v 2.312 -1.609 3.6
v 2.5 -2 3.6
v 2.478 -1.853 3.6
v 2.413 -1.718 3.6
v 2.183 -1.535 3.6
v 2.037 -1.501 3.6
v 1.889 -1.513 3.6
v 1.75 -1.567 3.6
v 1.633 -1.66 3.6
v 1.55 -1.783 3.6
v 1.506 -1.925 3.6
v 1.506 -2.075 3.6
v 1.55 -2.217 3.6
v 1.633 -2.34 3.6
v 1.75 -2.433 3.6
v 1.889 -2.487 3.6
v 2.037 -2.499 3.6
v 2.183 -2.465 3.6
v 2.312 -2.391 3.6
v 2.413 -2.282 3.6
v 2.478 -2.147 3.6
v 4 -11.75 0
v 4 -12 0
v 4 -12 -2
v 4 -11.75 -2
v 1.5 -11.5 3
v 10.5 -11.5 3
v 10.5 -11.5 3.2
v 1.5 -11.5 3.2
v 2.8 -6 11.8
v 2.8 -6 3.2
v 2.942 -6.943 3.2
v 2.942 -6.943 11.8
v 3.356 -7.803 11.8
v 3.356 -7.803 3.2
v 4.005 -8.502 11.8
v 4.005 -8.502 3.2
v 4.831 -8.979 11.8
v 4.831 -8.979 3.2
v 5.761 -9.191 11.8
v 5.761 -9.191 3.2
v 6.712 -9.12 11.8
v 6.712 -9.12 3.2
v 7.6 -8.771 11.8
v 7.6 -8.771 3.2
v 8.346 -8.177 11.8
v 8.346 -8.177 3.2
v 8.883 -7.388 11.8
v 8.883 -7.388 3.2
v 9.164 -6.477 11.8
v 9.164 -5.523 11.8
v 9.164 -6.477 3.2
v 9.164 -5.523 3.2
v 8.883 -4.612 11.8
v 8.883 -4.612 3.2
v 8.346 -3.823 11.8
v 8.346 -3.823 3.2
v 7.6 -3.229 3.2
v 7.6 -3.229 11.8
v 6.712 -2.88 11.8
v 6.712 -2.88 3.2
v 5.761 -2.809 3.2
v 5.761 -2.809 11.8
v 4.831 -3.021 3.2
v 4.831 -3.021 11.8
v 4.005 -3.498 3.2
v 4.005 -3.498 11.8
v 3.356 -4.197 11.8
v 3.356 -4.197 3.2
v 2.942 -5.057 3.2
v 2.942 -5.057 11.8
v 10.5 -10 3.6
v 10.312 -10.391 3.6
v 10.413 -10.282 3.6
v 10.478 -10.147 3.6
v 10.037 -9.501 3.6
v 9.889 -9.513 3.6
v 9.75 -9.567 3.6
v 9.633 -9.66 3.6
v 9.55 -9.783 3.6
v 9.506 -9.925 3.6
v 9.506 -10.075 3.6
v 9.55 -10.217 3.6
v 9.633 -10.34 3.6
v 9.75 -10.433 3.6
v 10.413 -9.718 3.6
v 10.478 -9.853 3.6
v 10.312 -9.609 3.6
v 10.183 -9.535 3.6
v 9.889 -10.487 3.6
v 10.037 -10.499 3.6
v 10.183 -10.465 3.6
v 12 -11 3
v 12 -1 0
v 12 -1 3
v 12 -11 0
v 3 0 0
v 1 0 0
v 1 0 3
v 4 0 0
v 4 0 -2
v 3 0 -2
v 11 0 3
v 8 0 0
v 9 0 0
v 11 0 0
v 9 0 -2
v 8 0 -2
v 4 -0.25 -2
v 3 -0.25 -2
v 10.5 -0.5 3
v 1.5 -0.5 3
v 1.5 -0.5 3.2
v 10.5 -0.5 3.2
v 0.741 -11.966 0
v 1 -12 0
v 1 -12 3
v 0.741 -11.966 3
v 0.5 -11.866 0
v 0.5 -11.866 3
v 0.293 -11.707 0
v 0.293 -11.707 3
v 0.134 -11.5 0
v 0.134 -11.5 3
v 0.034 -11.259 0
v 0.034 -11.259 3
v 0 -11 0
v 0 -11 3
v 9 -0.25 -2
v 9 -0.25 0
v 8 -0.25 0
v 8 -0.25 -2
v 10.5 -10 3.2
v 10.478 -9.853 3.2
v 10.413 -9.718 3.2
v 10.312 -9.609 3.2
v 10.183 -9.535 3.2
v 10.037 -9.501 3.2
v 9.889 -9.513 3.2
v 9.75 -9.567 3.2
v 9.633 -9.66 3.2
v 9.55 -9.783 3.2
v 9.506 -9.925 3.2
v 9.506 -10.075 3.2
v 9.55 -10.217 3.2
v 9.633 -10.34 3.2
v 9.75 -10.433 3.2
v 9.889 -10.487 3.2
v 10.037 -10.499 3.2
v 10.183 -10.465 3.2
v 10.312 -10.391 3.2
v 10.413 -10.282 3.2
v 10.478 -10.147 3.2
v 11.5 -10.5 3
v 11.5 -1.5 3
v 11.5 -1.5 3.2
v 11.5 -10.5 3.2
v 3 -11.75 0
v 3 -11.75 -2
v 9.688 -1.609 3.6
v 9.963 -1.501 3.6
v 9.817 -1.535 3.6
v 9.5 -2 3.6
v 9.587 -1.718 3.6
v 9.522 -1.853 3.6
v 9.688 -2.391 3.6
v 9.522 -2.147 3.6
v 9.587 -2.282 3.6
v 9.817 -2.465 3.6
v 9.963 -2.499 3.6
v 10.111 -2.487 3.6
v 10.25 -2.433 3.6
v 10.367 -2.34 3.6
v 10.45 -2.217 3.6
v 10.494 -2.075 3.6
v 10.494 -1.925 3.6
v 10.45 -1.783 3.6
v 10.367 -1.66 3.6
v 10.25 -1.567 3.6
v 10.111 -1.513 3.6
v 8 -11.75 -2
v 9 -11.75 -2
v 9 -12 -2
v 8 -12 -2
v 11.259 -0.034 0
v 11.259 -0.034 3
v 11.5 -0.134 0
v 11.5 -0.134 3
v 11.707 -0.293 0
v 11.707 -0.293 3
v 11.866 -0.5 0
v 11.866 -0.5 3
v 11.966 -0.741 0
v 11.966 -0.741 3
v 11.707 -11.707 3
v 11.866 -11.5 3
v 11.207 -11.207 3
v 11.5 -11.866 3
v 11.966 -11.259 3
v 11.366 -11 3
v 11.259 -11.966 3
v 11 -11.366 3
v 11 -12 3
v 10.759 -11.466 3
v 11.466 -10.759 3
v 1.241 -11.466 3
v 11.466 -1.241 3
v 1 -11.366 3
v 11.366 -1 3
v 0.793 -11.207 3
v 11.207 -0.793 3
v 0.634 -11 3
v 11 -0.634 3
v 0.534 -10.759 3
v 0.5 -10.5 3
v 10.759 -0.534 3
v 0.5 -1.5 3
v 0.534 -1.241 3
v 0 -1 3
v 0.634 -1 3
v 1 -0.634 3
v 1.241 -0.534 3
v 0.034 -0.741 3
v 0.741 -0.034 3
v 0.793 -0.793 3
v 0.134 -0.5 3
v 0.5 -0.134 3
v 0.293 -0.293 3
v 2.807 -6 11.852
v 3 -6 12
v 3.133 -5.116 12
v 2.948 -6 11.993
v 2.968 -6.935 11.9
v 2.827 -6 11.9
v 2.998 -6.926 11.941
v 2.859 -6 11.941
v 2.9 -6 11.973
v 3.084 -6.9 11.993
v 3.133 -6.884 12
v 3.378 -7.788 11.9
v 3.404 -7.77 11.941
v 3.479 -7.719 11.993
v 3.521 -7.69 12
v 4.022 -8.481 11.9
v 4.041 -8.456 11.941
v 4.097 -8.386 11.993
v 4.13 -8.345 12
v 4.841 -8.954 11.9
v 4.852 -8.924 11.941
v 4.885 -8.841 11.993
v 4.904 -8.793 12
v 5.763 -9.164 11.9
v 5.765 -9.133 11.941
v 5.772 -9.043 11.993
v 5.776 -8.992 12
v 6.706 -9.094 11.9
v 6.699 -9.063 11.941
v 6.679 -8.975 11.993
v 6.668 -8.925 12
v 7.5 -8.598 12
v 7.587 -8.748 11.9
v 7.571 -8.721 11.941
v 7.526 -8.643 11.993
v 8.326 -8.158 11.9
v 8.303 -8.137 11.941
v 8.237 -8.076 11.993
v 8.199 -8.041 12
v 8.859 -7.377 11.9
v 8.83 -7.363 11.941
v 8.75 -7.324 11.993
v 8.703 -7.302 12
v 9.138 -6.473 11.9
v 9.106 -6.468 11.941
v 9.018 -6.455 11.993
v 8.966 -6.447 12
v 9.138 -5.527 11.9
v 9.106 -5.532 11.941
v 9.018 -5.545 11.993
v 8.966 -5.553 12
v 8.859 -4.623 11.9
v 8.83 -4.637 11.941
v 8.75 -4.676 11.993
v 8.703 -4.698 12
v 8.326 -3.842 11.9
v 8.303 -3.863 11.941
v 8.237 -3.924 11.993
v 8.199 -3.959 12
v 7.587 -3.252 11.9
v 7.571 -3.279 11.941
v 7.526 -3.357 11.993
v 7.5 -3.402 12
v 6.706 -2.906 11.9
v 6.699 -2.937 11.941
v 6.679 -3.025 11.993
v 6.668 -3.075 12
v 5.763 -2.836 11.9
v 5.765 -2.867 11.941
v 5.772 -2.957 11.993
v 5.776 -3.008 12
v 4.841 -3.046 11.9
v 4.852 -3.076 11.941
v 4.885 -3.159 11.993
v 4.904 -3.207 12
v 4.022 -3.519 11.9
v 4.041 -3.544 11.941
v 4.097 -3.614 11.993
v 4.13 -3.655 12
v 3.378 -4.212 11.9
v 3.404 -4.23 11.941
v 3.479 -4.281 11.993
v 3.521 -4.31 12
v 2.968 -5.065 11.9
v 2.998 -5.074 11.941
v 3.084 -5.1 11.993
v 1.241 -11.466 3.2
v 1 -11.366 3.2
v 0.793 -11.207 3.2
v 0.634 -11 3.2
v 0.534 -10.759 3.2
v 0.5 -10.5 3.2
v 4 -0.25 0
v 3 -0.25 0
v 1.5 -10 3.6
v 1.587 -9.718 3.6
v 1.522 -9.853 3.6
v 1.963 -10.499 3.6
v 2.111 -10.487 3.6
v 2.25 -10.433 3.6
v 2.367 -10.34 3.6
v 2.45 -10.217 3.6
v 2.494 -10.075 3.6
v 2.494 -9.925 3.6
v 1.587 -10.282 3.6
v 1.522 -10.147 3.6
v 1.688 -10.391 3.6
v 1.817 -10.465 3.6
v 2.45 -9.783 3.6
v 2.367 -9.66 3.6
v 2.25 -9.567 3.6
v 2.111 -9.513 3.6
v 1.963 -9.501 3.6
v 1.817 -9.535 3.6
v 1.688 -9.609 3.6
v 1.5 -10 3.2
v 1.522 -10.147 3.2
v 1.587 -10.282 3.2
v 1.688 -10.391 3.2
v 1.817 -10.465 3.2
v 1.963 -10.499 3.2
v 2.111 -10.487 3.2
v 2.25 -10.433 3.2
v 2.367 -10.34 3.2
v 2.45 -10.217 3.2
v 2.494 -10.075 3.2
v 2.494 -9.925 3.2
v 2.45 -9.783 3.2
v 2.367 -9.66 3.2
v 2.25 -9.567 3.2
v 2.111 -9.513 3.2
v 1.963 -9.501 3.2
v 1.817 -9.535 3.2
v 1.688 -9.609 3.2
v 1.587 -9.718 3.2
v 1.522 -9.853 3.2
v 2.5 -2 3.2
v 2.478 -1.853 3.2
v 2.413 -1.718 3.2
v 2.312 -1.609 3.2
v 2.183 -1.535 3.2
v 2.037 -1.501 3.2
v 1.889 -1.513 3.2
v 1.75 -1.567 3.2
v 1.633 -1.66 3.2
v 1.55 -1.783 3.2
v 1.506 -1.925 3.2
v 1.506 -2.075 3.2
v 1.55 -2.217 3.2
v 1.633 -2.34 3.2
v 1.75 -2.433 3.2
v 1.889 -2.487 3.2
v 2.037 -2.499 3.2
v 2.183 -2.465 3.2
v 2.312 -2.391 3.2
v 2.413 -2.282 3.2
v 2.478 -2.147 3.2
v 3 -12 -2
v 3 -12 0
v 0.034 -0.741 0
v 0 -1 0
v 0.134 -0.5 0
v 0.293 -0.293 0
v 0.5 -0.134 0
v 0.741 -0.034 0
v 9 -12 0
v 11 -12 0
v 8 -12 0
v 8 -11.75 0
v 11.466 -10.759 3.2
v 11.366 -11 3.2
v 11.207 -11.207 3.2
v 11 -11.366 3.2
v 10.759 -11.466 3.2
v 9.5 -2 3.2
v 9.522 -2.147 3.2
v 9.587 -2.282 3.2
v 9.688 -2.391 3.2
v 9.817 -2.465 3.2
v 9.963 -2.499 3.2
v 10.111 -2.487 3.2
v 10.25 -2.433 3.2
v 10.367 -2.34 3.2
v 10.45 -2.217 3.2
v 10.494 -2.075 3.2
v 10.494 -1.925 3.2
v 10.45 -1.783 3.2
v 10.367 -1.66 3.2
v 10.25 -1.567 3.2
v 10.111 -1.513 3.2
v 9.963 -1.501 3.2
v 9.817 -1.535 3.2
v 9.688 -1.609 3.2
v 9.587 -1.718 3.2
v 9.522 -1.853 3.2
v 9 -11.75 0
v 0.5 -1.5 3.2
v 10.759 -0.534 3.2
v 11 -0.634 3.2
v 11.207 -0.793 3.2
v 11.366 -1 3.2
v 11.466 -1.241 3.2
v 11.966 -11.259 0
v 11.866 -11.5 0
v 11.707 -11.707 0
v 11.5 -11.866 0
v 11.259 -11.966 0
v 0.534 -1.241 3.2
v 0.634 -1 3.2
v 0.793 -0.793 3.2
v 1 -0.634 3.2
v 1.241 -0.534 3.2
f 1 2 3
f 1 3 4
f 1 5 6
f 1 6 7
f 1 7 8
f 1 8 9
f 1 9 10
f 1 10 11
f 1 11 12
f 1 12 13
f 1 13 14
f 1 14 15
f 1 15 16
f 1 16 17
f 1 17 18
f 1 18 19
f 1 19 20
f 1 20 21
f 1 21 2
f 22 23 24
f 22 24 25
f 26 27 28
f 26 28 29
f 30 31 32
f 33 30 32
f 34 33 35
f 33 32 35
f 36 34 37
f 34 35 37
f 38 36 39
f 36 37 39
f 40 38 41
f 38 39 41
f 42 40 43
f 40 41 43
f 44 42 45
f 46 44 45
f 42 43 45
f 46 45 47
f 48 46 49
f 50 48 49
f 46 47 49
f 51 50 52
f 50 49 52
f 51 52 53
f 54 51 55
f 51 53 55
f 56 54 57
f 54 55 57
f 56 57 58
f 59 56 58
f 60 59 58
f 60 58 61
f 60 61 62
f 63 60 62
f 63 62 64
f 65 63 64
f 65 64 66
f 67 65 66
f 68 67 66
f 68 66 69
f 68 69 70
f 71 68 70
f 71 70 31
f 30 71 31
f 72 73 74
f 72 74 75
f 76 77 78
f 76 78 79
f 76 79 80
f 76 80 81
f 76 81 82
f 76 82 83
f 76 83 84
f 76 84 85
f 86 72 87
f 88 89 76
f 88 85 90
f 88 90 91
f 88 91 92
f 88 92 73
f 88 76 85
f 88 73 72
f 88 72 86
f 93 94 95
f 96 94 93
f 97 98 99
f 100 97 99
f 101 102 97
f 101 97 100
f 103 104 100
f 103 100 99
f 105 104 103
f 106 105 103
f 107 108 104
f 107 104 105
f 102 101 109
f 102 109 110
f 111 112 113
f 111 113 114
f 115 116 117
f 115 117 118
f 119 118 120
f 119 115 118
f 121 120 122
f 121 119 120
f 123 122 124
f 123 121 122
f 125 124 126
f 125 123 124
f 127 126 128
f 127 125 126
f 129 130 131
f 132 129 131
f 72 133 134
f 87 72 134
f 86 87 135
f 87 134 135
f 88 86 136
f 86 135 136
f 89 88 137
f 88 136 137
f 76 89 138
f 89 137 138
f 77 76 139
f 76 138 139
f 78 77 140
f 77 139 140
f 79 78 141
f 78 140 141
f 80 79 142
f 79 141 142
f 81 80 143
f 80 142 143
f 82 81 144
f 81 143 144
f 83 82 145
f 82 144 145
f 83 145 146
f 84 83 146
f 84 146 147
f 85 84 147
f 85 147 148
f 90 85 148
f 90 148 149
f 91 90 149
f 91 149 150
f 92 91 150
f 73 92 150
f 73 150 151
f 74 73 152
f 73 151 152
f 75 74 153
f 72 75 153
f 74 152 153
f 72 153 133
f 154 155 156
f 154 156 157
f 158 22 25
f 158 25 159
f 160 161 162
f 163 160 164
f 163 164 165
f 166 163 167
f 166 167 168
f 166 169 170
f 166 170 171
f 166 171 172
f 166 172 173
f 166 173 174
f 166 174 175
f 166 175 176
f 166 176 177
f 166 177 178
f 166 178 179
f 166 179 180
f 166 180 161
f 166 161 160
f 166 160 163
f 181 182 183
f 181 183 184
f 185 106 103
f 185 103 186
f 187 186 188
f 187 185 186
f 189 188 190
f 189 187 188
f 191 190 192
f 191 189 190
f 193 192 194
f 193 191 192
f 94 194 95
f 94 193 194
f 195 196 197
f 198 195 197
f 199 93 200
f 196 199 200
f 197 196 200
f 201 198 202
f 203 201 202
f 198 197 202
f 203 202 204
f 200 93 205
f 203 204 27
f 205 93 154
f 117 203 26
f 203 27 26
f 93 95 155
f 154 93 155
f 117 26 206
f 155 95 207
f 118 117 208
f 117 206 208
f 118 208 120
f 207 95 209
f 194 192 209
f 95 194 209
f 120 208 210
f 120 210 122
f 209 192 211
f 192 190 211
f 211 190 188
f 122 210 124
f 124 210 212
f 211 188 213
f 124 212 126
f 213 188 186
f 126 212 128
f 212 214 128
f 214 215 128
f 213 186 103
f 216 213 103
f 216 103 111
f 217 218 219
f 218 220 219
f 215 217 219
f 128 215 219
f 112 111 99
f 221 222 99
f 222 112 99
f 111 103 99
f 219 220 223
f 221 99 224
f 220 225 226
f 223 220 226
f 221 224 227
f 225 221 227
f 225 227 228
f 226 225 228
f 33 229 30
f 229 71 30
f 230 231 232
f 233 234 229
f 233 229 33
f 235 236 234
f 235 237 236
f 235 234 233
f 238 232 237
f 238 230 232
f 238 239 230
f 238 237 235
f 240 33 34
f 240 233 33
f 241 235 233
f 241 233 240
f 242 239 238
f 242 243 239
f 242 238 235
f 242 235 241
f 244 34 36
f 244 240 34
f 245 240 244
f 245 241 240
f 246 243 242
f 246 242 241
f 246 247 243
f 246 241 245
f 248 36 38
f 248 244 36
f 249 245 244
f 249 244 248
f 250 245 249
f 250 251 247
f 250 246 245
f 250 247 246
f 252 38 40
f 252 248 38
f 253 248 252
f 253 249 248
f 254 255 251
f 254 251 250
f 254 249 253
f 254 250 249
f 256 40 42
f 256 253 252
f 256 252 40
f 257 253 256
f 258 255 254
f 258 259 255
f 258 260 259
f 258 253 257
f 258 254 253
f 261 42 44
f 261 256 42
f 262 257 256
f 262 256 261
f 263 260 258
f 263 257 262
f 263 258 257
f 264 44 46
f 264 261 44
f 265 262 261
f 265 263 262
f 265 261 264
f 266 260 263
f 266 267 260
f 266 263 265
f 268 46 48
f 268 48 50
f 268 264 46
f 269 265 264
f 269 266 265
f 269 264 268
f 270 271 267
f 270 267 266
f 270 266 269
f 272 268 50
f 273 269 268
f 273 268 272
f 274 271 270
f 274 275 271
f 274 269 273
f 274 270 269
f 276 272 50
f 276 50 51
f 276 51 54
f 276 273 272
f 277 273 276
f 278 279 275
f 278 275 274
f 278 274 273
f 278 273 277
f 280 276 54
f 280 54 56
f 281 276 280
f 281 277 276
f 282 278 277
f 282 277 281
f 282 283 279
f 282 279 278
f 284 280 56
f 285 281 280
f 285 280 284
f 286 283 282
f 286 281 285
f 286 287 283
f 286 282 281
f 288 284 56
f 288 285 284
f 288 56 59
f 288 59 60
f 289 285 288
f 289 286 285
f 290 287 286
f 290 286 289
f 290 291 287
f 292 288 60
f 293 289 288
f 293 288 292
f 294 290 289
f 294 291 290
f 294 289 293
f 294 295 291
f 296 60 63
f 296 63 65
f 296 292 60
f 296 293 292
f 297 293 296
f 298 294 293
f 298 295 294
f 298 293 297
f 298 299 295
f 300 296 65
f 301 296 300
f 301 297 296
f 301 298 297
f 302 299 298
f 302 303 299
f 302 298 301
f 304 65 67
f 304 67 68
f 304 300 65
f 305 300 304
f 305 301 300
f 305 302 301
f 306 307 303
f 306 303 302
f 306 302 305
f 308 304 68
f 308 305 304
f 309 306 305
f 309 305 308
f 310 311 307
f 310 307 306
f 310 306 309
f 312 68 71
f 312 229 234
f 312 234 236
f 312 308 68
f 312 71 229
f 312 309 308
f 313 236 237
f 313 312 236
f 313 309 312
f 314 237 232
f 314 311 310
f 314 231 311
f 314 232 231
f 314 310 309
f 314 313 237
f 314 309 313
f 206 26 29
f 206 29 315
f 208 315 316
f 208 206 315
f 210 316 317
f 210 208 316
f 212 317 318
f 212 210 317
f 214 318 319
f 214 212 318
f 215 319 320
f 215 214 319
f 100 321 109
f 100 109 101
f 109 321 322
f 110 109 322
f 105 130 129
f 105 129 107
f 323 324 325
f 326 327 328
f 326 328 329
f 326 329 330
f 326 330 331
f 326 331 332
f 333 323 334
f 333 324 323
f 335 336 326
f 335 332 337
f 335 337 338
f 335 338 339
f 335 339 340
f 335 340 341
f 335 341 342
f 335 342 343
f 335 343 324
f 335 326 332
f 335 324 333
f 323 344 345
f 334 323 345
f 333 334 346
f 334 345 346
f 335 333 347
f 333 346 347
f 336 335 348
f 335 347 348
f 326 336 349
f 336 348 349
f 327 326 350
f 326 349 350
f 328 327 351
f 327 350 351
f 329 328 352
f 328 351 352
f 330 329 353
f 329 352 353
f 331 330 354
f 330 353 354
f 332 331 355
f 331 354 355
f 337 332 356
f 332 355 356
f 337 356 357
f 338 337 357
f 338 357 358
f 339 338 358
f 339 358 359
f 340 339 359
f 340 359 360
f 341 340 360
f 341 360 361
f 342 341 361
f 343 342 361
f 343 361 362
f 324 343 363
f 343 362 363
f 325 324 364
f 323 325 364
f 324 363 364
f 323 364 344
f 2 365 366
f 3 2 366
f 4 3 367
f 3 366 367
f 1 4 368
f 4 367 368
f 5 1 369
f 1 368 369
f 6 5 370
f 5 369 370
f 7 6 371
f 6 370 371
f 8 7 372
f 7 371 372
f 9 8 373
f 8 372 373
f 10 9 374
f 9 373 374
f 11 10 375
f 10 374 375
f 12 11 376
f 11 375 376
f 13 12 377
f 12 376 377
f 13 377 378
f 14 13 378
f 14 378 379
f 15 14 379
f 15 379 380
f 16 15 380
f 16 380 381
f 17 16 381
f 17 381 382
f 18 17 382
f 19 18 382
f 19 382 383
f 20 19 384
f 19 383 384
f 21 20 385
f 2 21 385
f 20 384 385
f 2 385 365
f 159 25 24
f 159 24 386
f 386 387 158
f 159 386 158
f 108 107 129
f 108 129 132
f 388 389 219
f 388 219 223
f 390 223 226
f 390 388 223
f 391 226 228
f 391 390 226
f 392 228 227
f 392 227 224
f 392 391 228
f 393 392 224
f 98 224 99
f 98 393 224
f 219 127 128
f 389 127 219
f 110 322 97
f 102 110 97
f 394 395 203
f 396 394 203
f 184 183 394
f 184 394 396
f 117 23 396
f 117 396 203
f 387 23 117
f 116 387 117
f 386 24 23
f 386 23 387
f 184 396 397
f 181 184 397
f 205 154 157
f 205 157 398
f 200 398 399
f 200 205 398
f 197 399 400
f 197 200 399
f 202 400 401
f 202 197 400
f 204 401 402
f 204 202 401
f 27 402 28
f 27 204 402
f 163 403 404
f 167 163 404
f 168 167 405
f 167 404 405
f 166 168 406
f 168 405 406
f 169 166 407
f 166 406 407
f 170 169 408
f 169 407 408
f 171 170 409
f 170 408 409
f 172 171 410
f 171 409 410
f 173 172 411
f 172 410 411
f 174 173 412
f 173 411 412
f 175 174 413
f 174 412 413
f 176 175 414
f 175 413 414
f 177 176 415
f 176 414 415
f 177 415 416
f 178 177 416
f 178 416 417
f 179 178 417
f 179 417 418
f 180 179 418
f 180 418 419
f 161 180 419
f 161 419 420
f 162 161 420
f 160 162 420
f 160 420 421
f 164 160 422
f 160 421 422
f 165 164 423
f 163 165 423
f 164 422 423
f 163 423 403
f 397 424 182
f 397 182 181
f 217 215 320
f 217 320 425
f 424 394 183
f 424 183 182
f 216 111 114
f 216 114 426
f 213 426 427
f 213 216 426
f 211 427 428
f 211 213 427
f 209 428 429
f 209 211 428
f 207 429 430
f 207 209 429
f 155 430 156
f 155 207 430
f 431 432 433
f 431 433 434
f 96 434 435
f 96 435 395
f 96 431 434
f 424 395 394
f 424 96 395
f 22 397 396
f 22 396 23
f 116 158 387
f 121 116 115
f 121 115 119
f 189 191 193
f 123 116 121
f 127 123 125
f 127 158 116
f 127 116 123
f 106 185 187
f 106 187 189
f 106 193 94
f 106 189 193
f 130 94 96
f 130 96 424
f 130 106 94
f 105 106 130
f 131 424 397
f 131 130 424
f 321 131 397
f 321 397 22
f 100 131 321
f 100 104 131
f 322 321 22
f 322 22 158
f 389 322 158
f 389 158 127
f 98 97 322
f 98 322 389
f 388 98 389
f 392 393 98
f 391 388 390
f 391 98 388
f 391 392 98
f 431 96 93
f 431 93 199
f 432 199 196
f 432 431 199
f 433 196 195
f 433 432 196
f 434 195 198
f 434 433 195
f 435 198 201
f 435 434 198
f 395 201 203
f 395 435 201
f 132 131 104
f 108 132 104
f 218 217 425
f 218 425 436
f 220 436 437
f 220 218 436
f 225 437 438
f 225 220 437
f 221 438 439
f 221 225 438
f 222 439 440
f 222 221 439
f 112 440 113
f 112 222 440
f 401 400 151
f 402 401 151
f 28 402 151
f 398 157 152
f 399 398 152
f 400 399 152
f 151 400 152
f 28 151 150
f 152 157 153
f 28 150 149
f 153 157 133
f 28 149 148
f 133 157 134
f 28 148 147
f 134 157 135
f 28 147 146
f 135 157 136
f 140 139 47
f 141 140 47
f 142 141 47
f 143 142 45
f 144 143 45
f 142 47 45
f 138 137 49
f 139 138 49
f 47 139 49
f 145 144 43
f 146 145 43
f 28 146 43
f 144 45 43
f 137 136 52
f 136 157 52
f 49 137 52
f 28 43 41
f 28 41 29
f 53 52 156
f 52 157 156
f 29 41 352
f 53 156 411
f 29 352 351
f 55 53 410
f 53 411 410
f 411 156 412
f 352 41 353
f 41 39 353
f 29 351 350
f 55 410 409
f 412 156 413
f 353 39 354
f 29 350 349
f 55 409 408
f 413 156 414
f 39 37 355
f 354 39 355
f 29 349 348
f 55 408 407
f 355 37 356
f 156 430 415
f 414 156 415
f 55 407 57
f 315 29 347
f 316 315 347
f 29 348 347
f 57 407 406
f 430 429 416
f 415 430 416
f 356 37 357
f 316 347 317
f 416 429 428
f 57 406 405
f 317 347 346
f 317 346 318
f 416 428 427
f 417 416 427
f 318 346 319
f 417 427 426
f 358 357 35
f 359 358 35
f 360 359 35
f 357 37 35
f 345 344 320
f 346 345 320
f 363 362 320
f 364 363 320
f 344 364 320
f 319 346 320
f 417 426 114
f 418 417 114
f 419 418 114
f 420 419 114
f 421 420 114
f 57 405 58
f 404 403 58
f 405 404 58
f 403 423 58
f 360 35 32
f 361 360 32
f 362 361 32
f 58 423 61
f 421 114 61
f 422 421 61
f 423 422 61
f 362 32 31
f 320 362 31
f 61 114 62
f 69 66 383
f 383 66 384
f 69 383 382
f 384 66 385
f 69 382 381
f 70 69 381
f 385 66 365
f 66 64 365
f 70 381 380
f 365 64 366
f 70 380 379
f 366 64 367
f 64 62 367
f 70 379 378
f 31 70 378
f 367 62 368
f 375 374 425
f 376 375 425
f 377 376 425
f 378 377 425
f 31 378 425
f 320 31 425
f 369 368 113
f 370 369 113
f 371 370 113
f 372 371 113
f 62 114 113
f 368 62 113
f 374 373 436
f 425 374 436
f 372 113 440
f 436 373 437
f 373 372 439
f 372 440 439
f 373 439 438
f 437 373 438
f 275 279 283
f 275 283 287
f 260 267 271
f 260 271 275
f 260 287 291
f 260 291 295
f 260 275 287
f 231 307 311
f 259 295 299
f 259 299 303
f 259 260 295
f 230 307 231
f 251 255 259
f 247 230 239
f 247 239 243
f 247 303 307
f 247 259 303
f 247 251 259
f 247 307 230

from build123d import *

# Parameters (mm, degrees)
EXTRUDE_1_DEPTH = 3
SKETCH_2_R      = 3.2
EXTRUDE_2_DEPTH = 9
FILLET_1_R      = 0.2
EXTRUDE_3_DEPTH = 0.2
SKETCH_4_R      = 0.5
EXTRUDE_4_DEPTH = 0.4
SKETCH_5_W      = 1
SKETCH_5_H      = 0.25
EXTRUDE_5_DEPTH = 2


with BuildPart() as part:
    # 草图1 → 凸台-拉伸1 (new body)
    with BuildSketch(Plane.XY):
        with BuildLine():
            Line((1, 0), (11, 0))
            ThreePointArc((11, 0), (11.707106781, -0.292893219), (12, -1))
            Line((12, -1), (12, -11))
            ThreePointArc((12, -11), (11.707106781, -11.707106781), (11, -12))
            Line((11, -12), (1, -12))
            ThreePointArc((1, -12), (0.292893219, -11.707106781), (0, -11))
            Line((0, -11), (0, -1))
            ThreePointArc((0, -1), (0.292893219, -0.292893219), (1, 0))
        make_face()
    extrude(amount=EXTRUDE_1_DEPTH)

    # 草图2 → 凸台-拉伸2 (add)
    with BuildSketch(Plane.XY.offset(3)):
        with Locations(Location((6, -6, 0), (0, 0, 180))):
            Circle(SKETCH_2_R)
    extrude(amount=EXTRUDE_2_DEPTH)

    # 圆角1
    fillet_1_edges = [part.edges().sort_by_distance(p)[0] for p in [
        (9.2, -6, 12),
    ]]
    fillet(fillet_1_edges, radius=FILLET_1_R)

    # 草图3 → 凸台-拉伸3 (add)
    with BuildSketch(Plane.XY.offset(3)):
        with BuildLine():
            Line((1.5, -0.5), (10.5, -0.5))
            ThreePointArc((10.5, -0.5), (11.207106781, -0.792893219), (11.5, -1.5))
            Line((11.5, -1.5), (11.5, -10.5))
            ThreePointArc((11.5, -10.5), (11.207106781, -11.207106781), (10.5, -11.5))
            Line((10.5, -11.5), (1.5, -11.5))
            ThreePointArc((1.5, -11.5), (0.792893219, -11.207106781), (0.5, -10.5))
            Line((0.5, -10.5), (0.5, -1.5))
            ThreePointArc((0.5, -1.5), (0.792893219, -0.792893219), (1.5, -0.5))
        make_face()
    extrude(amount=EXTRUDE_3_DEPTH)

    # 草图4 → 凸台-拉伸4 (add)
    with BuildSketch(Plane.XY.offset(3.2)):
        with Locations((2, -2)):
            Circle(SKETCH_4_R)
        with Locations(Location((10, -2, 0), (0, 0, 180))):
            Circle(SKETCH_4_R)
        with Locations((10, -10)):
            Circle(SKETCH_4_R)
        with Locations(Location((2, -10, 0), (0, 0, 180))):
            Circle(SKETCH_4_R)
    extrude(amount=EXTRUDE_4_DEPTH)

    # 草图5 → 凸台-拉伸5 (add)
    with BuildSketch(Plane(origin=(0, 0, 0), x_dir=(-1, 0, 0), z_dir=(0, 0, -1))):
        with Locations((-3.5, -11.875)):
            Rectangle(SKETCH_5_W, SKETCH_5_H)
        with Locations((-8.5, -11.875)):
            Rectangle(SKETCH_5_W, SKETCH_5_H)
        with Locations((-8.5, -0.125)):
            Rectangle(SKETCH_5_W, SKETCH_5_H)
        with Locations((-3.5, -0.125)):
            Rectangle(SKETCH_5_W, SKETCH_5_H)
    extrude(amount=EXTRUDE_5_DEPTH)


solid = part.part
